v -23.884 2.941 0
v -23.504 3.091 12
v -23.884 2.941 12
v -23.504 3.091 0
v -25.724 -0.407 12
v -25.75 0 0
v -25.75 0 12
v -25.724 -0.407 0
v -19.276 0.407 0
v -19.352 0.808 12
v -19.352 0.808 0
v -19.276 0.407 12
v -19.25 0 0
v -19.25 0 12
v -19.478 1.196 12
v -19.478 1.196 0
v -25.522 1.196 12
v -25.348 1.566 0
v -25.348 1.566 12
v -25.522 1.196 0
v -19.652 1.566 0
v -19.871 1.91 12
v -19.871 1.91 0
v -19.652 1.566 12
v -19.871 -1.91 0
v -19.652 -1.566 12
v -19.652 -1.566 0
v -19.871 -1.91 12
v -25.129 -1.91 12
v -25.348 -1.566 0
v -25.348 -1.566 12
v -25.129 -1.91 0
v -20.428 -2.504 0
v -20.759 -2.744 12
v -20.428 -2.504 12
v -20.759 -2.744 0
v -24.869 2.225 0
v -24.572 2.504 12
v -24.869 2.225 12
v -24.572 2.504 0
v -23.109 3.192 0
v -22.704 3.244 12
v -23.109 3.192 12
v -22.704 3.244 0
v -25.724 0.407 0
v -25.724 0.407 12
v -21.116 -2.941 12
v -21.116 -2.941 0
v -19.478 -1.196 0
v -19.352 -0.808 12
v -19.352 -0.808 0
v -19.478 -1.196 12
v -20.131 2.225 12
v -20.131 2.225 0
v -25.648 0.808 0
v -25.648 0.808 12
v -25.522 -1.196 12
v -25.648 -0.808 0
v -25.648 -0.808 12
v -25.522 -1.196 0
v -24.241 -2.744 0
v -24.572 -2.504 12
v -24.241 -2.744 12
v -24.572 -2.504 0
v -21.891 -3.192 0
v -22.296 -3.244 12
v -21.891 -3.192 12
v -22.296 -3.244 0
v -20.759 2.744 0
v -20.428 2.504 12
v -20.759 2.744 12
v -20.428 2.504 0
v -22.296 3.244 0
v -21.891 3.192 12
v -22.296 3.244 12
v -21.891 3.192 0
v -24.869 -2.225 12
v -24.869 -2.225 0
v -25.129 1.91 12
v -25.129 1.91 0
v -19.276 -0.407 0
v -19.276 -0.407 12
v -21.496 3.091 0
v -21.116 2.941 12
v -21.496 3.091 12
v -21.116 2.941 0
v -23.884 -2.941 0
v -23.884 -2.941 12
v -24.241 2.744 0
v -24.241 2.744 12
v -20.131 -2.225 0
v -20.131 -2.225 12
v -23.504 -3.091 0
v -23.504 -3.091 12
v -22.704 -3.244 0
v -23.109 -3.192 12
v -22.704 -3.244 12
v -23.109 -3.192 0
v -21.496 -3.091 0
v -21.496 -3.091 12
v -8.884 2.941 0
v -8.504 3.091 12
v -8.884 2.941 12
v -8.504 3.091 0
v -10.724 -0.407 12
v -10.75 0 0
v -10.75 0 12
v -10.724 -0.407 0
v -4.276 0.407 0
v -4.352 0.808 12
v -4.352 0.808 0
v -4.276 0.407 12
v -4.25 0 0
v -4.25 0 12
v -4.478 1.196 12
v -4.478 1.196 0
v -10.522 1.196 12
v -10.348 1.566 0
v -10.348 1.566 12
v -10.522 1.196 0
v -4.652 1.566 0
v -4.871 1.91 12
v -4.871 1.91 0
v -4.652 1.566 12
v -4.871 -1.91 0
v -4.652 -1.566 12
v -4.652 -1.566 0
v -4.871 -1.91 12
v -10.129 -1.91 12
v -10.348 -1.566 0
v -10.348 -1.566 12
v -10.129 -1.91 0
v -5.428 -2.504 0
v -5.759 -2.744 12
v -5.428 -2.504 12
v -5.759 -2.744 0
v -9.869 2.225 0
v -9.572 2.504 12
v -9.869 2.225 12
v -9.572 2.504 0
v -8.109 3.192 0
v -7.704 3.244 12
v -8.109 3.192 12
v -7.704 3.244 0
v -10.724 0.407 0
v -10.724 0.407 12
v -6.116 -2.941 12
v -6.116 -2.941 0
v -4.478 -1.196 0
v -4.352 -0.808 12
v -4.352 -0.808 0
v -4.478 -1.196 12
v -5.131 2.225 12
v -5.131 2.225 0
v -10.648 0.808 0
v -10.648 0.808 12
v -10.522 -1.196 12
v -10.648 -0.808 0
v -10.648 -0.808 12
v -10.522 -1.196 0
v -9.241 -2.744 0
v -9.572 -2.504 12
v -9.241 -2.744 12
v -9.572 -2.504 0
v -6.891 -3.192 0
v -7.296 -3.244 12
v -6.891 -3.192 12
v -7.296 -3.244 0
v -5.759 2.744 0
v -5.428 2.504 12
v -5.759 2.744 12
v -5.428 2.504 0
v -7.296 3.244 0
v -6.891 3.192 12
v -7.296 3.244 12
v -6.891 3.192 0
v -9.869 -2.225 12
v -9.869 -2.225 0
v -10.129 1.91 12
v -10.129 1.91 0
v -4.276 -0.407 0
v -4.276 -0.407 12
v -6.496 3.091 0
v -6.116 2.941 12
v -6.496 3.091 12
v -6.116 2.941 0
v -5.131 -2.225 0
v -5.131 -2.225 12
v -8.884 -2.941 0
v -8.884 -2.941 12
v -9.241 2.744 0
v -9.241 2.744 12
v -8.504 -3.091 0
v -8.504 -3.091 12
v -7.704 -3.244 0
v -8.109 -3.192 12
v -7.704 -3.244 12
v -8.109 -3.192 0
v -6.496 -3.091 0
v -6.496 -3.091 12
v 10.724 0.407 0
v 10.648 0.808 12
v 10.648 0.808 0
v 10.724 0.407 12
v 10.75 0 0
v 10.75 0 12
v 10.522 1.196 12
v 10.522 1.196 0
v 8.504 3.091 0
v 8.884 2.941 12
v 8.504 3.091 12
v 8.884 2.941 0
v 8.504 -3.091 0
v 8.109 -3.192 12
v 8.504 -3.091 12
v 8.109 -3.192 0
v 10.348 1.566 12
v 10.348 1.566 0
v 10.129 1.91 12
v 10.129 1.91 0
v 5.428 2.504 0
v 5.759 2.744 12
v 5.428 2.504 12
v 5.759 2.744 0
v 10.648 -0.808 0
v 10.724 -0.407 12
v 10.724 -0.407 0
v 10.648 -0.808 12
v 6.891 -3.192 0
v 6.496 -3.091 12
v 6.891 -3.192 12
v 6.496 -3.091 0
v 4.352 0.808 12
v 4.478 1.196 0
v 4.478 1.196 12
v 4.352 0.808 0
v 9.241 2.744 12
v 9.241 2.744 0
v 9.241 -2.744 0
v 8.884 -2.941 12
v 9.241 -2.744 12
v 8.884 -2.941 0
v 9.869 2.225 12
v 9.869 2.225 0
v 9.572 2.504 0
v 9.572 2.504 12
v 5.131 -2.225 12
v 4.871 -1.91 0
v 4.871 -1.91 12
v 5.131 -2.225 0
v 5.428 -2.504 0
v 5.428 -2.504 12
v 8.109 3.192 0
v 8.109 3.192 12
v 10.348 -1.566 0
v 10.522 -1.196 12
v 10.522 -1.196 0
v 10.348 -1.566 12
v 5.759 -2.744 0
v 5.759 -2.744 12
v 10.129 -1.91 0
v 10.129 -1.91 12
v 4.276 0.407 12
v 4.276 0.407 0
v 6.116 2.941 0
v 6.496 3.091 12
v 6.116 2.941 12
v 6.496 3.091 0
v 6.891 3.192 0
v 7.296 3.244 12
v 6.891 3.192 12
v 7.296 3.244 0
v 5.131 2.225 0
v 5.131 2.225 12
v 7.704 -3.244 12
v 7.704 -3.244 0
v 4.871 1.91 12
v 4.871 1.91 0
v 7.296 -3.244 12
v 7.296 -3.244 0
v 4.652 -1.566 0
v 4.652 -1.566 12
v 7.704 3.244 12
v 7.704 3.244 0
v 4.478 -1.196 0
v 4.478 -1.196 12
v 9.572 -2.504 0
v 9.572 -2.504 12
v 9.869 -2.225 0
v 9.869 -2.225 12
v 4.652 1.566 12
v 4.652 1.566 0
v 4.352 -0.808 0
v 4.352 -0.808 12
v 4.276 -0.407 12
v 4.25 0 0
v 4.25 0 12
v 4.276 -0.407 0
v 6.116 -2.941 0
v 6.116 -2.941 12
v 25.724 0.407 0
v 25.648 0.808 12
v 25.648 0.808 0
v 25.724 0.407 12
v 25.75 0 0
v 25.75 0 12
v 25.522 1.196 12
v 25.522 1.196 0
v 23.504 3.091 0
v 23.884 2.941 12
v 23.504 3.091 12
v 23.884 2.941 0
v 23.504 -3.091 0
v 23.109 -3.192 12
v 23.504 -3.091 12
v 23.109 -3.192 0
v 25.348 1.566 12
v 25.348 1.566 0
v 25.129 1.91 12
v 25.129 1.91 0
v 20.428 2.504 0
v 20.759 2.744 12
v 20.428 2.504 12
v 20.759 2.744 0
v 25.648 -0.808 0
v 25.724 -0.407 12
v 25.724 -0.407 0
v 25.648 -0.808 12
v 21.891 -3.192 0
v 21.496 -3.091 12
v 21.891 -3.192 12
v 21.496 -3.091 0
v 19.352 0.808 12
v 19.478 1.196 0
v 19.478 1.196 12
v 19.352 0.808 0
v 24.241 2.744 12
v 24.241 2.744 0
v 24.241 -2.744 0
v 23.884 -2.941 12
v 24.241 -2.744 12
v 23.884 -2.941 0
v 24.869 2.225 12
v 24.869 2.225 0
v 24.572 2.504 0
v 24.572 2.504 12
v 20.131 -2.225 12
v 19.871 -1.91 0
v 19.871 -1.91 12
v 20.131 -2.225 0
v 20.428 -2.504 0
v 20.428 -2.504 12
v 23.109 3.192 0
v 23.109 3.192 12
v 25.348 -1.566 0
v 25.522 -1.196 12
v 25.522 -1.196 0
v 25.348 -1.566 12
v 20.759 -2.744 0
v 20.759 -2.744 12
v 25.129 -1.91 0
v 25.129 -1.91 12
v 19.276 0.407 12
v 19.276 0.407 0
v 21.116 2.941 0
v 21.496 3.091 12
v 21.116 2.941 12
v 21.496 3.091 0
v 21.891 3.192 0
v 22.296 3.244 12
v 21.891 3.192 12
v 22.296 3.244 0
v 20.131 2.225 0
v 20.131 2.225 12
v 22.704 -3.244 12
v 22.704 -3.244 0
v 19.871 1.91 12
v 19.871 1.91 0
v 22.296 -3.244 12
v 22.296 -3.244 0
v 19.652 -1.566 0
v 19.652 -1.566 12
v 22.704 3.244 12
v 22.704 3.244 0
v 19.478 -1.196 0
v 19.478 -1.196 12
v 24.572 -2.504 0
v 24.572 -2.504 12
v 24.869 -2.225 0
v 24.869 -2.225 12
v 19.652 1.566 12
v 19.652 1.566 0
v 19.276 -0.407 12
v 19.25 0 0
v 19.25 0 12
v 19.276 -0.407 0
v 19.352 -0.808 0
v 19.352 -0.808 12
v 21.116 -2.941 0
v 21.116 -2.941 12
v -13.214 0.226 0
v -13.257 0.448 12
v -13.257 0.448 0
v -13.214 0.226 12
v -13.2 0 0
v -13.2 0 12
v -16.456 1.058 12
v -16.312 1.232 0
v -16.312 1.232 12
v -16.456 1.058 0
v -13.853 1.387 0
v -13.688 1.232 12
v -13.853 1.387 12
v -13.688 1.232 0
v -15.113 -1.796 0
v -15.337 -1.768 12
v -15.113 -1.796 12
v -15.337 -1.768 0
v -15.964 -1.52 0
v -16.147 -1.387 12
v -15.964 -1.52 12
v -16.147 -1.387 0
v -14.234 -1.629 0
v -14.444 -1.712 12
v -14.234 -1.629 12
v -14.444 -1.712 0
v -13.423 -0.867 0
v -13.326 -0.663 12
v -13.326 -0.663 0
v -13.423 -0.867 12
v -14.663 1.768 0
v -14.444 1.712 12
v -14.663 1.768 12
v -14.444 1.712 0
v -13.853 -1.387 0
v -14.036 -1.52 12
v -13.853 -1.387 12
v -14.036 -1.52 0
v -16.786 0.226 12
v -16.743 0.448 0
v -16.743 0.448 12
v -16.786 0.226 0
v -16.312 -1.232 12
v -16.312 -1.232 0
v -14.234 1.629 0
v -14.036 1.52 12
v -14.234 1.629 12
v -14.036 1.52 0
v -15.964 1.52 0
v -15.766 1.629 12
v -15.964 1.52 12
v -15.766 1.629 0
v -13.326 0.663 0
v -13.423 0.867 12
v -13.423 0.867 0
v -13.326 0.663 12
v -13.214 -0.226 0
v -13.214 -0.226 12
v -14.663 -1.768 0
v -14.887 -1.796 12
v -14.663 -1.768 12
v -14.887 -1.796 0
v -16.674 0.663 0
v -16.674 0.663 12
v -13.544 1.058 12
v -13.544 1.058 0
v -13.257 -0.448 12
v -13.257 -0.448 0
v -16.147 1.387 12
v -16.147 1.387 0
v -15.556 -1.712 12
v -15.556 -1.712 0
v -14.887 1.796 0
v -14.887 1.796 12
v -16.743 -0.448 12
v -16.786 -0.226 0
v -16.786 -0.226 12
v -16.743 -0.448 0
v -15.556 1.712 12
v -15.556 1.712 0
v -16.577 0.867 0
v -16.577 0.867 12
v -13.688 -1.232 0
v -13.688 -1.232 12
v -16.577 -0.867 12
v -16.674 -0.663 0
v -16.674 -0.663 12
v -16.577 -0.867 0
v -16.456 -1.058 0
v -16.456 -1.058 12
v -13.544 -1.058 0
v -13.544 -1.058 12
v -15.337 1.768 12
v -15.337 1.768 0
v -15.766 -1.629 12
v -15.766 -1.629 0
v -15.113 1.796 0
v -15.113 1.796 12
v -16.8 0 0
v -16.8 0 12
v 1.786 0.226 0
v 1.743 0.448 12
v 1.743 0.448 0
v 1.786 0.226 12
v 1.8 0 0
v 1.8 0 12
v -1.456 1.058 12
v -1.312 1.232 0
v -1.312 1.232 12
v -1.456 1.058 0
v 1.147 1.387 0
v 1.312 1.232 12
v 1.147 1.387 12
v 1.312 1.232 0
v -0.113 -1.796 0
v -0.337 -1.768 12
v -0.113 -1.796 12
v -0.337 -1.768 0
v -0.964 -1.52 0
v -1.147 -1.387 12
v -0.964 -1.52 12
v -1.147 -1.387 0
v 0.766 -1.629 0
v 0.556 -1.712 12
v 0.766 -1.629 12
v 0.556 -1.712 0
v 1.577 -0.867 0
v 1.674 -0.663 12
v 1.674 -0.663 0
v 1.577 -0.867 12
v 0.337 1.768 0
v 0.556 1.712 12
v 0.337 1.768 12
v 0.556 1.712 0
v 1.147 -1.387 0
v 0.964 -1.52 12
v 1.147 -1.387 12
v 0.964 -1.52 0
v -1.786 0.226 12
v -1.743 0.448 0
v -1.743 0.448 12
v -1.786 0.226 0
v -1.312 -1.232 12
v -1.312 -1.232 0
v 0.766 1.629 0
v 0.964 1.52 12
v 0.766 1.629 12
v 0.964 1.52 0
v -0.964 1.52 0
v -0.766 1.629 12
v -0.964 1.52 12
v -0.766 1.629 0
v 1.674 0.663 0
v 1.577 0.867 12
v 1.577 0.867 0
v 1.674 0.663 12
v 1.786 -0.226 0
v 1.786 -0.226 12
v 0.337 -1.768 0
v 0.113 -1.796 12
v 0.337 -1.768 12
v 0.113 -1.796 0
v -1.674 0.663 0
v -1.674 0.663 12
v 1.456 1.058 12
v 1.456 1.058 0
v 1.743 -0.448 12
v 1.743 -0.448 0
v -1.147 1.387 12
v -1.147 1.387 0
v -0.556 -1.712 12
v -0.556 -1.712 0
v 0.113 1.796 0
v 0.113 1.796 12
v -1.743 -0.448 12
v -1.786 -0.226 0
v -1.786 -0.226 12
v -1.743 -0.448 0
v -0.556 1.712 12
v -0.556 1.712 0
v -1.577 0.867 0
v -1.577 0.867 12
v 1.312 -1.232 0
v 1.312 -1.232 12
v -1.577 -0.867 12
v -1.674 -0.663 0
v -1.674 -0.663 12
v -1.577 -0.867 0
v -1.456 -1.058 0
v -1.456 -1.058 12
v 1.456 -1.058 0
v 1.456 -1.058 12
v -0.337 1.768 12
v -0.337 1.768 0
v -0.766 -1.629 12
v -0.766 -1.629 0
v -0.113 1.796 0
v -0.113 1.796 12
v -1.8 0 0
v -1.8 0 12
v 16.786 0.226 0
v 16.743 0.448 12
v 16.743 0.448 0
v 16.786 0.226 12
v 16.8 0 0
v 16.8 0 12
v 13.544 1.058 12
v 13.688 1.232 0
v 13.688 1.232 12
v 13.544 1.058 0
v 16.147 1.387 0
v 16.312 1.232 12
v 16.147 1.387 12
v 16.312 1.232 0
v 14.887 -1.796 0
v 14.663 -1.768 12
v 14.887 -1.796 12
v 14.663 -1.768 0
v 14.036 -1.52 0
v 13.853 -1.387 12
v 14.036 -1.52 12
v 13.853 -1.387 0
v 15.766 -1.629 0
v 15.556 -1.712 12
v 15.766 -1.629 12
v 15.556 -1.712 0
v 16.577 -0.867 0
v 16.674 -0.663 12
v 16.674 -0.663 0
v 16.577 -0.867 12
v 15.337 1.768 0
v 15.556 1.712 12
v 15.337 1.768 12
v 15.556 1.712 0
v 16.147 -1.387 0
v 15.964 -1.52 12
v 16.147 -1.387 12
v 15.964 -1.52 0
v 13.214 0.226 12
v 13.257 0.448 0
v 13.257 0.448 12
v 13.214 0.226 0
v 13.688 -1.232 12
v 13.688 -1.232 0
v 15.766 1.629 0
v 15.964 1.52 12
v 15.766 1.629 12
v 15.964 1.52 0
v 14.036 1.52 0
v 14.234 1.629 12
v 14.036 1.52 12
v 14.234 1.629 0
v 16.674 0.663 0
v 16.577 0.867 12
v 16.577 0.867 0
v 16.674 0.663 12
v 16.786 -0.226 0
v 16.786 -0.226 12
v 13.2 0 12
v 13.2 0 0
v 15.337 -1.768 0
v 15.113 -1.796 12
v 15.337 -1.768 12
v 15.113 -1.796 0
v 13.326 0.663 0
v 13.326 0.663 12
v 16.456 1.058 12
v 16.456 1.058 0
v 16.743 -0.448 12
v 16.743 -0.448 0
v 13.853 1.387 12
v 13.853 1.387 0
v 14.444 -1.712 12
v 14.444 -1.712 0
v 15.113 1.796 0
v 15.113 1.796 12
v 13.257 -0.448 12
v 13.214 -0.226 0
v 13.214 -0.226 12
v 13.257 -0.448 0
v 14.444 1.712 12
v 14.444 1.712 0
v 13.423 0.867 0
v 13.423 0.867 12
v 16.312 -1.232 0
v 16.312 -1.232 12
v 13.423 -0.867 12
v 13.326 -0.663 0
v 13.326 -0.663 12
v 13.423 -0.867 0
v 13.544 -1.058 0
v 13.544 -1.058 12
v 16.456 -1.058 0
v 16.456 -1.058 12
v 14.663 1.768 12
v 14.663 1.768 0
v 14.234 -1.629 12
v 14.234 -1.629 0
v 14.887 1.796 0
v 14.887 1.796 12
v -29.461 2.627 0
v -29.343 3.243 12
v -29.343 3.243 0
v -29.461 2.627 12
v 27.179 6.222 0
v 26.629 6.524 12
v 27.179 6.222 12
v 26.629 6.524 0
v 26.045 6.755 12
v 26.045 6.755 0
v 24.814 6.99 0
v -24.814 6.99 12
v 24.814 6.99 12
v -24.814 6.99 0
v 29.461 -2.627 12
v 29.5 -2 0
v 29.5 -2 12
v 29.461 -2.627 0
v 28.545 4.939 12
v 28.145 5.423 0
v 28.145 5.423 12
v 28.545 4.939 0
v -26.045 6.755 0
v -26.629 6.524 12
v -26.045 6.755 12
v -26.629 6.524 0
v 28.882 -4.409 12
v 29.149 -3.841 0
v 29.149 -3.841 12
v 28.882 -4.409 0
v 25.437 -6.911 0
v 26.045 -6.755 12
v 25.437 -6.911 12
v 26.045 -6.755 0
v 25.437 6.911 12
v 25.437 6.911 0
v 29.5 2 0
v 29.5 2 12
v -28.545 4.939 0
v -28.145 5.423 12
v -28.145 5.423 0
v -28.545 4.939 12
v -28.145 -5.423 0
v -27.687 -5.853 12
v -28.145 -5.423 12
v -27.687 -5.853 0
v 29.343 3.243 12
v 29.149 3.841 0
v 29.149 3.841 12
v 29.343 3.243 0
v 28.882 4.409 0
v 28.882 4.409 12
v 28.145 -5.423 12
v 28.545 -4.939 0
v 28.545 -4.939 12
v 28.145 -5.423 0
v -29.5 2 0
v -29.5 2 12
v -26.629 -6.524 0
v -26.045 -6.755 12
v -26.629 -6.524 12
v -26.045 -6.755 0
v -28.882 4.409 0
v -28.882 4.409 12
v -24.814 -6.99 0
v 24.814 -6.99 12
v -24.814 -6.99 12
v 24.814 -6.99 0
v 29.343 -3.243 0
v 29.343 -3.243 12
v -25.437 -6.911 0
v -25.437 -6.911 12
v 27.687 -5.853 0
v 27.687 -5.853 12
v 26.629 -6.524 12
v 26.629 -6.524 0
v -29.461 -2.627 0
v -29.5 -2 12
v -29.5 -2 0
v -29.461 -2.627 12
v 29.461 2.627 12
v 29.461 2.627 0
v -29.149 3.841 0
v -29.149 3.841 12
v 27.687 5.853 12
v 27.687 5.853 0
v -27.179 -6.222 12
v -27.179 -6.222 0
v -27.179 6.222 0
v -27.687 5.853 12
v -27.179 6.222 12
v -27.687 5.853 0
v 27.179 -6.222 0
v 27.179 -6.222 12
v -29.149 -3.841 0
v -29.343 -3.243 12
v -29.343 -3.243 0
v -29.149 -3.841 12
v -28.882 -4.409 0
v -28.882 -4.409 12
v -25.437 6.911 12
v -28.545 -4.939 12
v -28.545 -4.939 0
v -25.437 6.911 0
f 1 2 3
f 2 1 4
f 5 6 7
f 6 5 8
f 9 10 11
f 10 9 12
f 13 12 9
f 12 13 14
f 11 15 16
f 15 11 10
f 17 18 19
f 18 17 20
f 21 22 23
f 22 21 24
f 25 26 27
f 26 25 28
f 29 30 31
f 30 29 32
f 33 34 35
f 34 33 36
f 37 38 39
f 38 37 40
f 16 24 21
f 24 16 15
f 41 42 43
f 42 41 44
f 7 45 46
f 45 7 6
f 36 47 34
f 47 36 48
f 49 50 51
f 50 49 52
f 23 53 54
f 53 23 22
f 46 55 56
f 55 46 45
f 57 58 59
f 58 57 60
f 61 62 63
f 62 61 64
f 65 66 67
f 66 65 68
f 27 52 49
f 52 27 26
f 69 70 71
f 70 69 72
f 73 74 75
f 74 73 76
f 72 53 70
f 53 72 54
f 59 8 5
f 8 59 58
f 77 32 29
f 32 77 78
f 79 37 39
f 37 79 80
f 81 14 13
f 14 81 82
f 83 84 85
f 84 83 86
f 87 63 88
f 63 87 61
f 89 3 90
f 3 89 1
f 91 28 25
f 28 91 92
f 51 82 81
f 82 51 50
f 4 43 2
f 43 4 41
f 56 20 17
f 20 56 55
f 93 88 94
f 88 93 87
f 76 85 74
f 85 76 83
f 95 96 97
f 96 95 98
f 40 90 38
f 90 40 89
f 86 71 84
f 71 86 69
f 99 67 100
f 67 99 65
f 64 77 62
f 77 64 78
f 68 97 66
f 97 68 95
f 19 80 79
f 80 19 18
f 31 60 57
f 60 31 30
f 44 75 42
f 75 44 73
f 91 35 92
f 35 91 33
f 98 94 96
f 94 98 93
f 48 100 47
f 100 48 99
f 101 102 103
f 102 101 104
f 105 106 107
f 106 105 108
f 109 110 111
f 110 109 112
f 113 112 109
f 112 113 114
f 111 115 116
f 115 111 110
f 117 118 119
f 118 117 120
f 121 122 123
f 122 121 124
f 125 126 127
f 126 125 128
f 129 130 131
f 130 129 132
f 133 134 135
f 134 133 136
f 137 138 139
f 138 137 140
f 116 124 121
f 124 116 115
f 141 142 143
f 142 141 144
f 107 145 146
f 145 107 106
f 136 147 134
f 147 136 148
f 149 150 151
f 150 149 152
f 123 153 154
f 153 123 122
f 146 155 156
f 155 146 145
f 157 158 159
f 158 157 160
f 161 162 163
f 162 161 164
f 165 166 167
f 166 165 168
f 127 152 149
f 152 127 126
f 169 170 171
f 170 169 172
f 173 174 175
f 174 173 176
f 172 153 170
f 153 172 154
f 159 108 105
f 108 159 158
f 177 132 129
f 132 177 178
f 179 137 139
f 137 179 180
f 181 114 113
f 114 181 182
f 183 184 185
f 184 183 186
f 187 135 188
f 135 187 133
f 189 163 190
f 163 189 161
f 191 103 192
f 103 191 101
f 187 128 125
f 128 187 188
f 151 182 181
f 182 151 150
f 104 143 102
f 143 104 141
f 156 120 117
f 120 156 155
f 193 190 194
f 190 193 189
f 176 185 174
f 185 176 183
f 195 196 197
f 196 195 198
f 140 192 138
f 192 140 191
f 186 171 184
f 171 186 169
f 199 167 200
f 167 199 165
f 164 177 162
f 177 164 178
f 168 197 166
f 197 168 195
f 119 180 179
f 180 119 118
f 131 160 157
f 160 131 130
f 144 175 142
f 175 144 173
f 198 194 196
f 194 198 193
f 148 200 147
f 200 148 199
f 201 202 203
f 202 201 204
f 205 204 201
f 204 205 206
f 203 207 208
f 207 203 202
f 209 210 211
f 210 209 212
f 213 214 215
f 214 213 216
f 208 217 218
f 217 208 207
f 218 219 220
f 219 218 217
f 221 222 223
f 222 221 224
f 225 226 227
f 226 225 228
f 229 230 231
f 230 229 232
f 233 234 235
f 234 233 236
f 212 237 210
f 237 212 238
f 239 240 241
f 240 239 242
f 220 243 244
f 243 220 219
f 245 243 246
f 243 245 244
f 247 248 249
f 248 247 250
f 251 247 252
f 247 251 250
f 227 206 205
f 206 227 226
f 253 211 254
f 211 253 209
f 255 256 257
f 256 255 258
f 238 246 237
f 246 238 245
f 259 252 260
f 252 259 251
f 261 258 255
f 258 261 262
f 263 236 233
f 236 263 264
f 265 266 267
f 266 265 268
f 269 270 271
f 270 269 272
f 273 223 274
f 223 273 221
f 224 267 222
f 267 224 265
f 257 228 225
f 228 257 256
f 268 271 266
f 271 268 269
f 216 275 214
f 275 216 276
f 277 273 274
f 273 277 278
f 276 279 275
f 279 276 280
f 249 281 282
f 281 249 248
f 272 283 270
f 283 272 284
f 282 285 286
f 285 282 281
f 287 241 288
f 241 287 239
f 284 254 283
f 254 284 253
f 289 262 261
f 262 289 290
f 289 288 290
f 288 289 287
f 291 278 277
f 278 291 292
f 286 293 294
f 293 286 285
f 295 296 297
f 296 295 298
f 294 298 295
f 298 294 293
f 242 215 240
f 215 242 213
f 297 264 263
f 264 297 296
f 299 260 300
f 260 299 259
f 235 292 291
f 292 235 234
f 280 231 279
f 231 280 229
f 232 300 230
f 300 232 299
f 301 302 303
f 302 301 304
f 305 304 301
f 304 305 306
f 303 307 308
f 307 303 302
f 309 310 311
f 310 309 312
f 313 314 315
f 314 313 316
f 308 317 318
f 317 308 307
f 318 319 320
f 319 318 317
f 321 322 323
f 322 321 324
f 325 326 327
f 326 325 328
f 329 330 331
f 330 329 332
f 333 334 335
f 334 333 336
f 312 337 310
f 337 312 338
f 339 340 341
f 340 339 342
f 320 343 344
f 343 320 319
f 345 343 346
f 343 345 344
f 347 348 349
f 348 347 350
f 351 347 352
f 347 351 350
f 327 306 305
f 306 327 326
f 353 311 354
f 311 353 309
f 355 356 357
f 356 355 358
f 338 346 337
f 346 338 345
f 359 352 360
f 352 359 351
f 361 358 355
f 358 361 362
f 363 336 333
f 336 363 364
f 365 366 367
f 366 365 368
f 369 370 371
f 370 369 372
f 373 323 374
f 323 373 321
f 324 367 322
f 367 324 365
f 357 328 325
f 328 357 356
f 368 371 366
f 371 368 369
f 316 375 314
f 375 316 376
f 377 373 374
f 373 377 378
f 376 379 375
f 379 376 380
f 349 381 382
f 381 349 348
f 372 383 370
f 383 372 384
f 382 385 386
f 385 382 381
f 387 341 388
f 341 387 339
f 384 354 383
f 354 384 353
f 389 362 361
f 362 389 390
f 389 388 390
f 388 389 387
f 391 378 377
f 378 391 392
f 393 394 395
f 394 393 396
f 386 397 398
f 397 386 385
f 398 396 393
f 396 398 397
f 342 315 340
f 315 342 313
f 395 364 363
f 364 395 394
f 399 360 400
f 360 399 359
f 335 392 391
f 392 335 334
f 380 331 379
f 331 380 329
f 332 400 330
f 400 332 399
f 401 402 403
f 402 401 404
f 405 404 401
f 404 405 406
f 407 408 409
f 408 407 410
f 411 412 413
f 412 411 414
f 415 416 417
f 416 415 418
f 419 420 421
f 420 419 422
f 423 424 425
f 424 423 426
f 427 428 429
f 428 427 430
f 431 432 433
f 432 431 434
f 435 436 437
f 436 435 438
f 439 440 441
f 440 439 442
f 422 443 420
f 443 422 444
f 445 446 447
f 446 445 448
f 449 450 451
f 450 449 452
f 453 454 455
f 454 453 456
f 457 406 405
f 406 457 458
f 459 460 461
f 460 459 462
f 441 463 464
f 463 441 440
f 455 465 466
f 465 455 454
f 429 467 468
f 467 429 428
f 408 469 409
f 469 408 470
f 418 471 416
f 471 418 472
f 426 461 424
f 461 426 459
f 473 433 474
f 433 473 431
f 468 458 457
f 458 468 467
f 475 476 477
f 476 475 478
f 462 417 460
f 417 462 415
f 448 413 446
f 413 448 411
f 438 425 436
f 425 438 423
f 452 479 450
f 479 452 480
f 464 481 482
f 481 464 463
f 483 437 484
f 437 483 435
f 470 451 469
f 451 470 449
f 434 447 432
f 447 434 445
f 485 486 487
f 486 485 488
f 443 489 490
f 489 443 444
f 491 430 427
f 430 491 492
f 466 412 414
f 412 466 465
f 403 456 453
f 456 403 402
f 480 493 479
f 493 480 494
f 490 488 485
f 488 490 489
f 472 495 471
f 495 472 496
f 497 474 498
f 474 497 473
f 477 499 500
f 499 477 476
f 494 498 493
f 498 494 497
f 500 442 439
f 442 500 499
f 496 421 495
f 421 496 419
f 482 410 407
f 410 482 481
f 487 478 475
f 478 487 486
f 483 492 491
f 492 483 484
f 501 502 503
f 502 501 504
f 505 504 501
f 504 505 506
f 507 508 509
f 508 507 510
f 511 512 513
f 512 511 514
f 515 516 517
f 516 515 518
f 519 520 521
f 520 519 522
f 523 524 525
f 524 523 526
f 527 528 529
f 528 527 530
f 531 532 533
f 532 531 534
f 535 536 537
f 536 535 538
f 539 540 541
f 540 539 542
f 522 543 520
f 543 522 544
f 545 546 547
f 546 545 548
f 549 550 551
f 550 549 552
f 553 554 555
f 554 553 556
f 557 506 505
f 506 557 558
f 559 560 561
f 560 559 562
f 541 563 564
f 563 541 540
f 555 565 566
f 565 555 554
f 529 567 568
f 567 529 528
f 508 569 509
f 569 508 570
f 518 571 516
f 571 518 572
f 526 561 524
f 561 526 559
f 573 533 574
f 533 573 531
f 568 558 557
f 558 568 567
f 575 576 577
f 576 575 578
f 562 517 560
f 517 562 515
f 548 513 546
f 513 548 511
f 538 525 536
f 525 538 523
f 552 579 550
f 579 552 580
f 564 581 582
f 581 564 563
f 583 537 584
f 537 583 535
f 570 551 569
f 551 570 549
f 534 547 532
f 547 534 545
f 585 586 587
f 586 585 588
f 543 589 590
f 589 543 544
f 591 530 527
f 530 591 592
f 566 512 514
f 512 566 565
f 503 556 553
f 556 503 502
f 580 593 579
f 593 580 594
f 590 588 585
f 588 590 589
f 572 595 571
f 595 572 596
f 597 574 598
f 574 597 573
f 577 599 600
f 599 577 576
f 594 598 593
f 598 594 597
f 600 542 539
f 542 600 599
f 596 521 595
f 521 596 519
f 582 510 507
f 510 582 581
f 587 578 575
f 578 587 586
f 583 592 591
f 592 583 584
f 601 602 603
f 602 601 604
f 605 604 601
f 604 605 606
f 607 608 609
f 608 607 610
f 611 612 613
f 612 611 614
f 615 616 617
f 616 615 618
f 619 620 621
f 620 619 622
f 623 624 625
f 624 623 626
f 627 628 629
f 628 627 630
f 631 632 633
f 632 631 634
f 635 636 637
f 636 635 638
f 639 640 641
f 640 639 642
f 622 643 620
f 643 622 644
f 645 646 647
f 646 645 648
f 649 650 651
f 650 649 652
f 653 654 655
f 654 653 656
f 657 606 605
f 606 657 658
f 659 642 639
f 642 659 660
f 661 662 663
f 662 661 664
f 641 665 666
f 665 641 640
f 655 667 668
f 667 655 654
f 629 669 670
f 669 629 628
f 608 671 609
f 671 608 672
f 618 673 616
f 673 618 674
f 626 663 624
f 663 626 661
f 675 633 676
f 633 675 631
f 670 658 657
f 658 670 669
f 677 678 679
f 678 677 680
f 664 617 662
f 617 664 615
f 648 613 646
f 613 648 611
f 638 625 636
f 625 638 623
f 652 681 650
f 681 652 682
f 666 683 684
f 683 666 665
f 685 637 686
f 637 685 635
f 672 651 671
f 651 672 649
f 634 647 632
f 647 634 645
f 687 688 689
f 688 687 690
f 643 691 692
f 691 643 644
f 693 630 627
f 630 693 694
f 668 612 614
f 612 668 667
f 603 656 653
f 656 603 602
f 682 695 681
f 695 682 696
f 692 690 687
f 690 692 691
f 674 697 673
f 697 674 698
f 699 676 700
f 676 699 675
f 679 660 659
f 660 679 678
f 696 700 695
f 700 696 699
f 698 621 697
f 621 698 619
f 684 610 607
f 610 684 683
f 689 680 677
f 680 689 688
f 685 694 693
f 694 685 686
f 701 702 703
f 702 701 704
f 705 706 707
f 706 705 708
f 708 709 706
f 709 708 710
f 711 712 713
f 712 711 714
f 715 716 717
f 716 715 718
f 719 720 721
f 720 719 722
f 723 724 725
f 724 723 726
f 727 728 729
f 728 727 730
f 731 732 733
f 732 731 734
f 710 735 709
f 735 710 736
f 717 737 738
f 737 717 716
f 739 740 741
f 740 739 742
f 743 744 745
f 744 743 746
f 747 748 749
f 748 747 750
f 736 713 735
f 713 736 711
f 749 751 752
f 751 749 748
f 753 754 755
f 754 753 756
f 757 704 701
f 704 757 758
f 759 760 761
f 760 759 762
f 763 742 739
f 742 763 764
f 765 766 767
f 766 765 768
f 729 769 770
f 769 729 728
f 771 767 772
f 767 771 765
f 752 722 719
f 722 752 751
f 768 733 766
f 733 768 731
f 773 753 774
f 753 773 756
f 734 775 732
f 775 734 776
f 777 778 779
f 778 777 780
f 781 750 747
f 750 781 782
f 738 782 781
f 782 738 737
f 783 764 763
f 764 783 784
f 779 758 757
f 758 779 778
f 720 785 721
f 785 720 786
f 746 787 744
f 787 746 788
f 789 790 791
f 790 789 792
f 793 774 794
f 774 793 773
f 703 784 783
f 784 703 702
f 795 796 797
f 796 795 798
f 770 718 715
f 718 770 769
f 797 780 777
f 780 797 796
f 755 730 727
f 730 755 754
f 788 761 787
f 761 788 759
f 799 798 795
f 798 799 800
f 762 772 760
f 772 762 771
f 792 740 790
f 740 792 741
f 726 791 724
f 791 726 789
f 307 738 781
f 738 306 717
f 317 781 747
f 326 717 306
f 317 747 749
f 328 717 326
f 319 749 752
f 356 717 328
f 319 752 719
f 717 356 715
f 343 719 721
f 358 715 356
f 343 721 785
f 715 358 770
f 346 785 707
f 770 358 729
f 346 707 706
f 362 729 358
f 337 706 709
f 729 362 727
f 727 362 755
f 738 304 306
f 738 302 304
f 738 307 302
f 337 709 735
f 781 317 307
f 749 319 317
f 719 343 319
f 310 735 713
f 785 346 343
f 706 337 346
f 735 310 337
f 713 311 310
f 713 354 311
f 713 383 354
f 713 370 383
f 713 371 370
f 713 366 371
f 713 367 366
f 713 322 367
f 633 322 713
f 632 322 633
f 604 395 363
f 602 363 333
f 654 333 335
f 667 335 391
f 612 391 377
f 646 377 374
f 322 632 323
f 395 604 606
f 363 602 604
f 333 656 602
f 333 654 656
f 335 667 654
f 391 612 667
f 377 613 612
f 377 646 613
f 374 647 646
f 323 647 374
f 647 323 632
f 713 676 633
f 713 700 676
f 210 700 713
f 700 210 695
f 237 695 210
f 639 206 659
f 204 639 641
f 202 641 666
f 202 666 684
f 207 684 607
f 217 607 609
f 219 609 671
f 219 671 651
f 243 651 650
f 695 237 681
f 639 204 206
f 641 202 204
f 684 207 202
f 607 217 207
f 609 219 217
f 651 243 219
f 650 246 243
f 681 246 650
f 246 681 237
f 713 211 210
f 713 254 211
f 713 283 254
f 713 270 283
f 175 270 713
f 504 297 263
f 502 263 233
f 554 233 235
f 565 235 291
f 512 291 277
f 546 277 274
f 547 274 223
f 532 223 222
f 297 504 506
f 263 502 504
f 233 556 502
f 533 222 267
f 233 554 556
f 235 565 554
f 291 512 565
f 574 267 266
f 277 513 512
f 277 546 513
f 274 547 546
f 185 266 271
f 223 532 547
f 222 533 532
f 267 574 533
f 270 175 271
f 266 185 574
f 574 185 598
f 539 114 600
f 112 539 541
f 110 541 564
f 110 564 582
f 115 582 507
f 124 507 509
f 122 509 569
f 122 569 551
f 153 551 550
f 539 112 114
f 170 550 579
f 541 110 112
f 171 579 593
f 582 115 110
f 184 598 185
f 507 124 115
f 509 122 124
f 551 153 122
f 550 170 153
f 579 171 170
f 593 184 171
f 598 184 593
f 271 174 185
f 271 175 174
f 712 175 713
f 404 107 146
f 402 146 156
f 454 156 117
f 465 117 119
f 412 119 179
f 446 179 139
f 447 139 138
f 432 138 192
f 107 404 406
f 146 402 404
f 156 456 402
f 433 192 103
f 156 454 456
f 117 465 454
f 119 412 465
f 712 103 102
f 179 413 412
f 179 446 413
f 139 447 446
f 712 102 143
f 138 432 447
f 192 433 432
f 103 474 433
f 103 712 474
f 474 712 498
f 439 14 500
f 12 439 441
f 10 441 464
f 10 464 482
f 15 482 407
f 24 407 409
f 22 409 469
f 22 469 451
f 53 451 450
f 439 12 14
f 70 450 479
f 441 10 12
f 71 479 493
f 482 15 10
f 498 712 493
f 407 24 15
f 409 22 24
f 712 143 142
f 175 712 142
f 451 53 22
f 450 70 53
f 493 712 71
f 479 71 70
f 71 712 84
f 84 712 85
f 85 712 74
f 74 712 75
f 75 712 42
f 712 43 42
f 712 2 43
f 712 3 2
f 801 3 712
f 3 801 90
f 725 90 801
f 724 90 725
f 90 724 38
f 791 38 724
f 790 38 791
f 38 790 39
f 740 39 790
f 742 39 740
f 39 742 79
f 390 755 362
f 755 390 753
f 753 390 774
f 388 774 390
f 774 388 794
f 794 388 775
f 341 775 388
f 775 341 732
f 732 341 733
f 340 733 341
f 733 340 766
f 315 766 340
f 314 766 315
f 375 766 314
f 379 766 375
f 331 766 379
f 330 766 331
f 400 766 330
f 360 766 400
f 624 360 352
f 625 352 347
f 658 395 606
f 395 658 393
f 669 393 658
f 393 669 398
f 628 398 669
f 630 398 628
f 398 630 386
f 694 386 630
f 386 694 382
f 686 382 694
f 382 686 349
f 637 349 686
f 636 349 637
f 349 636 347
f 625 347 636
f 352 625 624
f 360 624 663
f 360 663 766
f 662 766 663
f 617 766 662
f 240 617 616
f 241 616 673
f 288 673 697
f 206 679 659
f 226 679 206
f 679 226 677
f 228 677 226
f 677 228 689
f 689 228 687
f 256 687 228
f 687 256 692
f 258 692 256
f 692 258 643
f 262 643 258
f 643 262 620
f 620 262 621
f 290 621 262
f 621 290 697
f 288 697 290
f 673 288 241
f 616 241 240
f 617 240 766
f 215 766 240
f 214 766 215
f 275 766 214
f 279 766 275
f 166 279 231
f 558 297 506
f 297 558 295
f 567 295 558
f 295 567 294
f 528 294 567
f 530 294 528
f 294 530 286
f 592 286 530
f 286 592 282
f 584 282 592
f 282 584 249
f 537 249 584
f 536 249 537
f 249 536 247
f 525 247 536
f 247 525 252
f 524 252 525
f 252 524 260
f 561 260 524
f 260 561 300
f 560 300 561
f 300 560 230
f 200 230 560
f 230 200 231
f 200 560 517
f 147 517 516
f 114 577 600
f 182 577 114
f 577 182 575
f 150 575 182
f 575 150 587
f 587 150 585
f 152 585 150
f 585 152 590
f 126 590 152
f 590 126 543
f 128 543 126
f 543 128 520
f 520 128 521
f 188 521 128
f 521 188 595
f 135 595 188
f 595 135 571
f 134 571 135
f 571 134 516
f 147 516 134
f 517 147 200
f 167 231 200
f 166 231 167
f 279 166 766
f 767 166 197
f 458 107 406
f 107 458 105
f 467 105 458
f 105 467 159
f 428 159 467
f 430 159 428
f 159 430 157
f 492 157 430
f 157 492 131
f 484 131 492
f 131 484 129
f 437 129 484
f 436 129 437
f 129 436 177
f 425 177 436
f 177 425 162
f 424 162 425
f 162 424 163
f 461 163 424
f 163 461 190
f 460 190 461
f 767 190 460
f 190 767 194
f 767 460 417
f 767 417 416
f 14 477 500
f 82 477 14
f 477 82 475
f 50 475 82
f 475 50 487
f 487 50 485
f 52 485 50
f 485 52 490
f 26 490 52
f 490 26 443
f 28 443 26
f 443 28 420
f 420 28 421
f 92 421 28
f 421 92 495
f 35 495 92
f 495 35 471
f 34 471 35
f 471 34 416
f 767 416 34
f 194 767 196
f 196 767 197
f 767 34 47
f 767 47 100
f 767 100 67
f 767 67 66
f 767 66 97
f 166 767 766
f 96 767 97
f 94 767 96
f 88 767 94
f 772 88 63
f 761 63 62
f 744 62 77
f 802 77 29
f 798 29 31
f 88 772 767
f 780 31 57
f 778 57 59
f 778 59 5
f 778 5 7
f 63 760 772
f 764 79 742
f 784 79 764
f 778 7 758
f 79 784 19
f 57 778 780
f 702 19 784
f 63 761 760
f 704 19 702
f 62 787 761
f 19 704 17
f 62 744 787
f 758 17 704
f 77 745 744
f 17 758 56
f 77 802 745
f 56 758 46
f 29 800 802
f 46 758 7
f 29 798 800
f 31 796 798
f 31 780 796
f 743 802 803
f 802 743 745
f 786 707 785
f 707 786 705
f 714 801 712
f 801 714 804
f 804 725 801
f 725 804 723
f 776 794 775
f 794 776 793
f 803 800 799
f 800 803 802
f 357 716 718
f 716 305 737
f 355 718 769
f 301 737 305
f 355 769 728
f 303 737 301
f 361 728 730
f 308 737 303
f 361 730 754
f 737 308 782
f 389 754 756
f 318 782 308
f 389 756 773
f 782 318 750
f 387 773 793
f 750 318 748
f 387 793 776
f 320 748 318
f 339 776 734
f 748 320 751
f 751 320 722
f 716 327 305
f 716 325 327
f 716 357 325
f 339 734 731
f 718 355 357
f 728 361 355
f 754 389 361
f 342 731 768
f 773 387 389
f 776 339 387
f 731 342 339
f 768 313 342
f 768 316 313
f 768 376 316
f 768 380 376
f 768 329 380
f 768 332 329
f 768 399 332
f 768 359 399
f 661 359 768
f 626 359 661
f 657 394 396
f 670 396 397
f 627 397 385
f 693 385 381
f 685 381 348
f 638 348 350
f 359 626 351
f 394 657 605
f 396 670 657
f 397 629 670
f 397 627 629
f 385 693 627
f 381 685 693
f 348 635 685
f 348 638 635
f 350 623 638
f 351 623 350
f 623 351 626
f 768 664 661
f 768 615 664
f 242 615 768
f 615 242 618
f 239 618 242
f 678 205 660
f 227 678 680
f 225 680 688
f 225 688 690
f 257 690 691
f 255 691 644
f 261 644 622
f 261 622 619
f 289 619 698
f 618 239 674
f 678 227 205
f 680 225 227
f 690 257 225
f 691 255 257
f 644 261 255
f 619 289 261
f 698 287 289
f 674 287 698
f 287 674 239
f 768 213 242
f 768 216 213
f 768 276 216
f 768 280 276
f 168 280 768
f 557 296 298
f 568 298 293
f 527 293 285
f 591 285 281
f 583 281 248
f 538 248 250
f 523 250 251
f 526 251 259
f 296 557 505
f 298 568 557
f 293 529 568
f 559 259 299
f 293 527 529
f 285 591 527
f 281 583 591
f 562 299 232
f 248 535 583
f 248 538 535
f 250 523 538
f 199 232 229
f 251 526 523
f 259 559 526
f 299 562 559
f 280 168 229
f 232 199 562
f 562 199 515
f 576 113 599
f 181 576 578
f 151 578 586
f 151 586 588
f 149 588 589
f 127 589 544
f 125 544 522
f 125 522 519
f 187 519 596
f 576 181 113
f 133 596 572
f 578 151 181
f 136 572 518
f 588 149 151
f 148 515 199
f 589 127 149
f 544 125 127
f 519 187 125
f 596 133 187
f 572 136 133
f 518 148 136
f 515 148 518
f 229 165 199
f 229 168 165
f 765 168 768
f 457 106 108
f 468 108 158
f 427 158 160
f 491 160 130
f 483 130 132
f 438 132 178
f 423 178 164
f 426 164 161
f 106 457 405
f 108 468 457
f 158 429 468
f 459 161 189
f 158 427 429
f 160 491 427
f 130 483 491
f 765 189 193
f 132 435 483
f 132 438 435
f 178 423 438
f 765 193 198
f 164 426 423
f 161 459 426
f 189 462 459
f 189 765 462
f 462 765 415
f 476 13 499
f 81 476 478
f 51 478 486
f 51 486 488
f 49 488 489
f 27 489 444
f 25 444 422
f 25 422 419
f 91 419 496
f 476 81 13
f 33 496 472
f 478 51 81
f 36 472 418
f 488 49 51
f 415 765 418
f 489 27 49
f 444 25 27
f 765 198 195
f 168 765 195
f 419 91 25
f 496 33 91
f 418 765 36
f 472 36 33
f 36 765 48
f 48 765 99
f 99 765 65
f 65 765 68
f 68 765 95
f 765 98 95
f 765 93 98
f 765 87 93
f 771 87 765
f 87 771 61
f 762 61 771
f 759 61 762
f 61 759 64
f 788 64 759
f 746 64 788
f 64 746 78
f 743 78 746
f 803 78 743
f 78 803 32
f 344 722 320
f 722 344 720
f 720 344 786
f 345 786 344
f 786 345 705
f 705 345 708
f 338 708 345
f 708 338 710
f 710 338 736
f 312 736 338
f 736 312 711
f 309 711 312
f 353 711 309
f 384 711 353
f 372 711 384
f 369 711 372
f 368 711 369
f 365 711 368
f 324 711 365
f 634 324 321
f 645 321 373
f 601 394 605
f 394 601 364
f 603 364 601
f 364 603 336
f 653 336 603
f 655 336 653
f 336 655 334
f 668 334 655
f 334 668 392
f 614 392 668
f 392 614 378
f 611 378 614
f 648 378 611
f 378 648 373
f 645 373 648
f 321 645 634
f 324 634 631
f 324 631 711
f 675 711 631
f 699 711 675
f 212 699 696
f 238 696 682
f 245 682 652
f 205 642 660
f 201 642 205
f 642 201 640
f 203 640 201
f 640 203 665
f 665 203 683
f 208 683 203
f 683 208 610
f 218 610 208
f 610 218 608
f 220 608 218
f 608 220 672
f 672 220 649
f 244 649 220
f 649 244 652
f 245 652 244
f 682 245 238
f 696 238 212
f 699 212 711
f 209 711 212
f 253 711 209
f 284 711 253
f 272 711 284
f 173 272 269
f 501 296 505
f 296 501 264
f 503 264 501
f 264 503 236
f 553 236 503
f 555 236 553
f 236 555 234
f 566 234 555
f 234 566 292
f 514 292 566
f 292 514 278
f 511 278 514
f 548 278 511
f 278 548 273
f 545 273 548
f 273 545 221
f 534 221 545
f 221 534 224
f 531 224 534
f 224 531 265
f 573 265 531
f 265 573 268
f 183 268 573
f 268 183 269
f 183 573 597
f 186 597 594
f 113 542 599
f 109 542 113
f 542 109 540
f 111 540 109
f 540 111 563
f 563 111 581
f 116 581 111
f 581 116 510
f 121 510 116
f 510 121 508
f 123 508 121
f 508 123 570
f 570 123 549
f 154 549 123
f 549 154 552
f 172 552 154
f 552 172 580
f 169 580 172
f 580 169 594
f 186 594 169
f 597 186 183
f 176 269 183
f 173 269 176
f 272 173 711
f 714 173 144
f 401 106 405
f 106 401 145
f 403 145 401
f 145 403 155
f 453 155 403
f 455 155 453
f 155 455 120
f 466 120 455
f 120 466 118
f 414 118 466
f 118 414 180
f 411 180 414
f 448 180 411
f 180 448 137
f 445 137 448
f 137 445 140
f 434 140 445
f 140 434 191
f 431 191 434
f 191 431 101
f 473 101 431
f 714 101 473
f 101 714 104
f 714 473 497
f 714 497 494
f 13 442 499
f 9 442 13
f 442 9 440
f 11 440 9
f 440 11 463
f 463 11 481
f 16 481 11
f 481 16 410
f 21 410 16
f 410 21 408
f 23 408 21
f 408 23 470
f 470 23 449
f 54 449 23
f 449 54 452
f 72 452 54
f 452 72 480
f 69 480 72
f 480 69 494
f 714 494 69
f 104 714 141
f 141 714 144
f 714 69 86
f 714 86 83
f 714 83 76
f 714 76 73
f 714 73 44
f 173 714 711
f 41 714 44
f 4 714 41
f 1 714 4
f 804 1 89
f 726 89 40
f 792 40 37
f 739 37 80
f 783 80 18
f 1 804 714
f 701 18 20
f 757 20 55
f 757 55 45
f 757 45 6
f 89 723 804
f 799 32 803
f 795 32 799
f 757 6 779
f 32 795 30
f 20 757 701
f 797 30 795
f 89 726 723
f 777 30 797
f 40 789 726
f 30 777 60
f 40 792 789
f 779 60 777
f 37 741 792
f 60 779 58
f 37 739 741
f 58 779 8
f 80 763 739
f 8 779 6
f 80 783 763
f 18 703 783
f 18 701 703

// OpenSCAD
$fn = 50;


difference() {
	union() {
		hull() {
			translate(v = [-24.5000000000, 2.0000000000, 0]) {
				cylinder(h = 12, r = 5);
			}
			translate(v = [24.5000000000, 2.0000000000, 0]) {
				cylinder(h = 12, r = 5);
			}
			translate(v = [-24.5000000000, -2.0000000000, 0]) {
				cylinder(h = 12, r = 5);
			}
			translate(v = [24.5000000000, -2.0000000000, 0]) {
				cylinder(h = 12, r = 5);
			}
		}
	}
	union() {
		translate(v = [-22.5000000000, 0.0000000000, 0]) {
			translate(v = [0, 0, -100]) {
				cylinder(h = 200, r = 3.2500000000);
			}
		}
		translate(v = [-7.5000000000, 0.0000000000, 0]) {
			translate(v = [0, 0, -100]) {
				cylinder(h = 200, r = 3.2500000000);
			}
		}
		translate(v = [7.5000000000, 0.0000000000, 0]) {
			translate(v = [0, 0, -100]) {
				cylinder(h = 200, r = 3.2500000000);
			}
		}
		translate(v = [22.5000000000, 0.0000000000, 0]) {
			translate(v = [0, 0, -100]) {
				cylinder(h = 200, r = 3.2500000000);
			}
		}
		translate(v = [-22.5000000000, 0.0000000000, 0]) {
			translate(v = [0, 0, -100]) {
				cylinder(h = 200, r = 1.8000000000);
			}
		}
		translate(v = [-15.0000000000, 0.0000000000, 0]) {
			translate(v = [0, 0, -100]) {
				cylinder(h = 200, r = 1.8000000000);
			}
		}
		translate(v = [-7.5000000000, 0.0000000000, 0]) {
			translate(v = [0, 0, -100]) {
				cylinder(h = 200, r = 1.8000000000);
			}
		}
		translate(v = [0, 0, -100]) {
			cylinder(h = 200, r = 1.8000000000);
		}
		translate(v = [7.5000000000, 0.0000000000, 0]) {
			translate(v = [0, 0, -100]) {
				cylinder(h = 200, r = 1.8000000000);
			}
		}
		translate(v = [15.0000000000, 0.0000000000, 0]) {
			translate(v = [0, 0, -100]) {
				cylinder(h = 200, r = 1.8000000000);
			}
		}
		translate(v = [22.5000000000, 0.0000000000, 0]) {
			translate(v = [0, 0, -100]) {
				cylinder(h = 200, r = 1.8000000000);
			}
		}
	}
}
